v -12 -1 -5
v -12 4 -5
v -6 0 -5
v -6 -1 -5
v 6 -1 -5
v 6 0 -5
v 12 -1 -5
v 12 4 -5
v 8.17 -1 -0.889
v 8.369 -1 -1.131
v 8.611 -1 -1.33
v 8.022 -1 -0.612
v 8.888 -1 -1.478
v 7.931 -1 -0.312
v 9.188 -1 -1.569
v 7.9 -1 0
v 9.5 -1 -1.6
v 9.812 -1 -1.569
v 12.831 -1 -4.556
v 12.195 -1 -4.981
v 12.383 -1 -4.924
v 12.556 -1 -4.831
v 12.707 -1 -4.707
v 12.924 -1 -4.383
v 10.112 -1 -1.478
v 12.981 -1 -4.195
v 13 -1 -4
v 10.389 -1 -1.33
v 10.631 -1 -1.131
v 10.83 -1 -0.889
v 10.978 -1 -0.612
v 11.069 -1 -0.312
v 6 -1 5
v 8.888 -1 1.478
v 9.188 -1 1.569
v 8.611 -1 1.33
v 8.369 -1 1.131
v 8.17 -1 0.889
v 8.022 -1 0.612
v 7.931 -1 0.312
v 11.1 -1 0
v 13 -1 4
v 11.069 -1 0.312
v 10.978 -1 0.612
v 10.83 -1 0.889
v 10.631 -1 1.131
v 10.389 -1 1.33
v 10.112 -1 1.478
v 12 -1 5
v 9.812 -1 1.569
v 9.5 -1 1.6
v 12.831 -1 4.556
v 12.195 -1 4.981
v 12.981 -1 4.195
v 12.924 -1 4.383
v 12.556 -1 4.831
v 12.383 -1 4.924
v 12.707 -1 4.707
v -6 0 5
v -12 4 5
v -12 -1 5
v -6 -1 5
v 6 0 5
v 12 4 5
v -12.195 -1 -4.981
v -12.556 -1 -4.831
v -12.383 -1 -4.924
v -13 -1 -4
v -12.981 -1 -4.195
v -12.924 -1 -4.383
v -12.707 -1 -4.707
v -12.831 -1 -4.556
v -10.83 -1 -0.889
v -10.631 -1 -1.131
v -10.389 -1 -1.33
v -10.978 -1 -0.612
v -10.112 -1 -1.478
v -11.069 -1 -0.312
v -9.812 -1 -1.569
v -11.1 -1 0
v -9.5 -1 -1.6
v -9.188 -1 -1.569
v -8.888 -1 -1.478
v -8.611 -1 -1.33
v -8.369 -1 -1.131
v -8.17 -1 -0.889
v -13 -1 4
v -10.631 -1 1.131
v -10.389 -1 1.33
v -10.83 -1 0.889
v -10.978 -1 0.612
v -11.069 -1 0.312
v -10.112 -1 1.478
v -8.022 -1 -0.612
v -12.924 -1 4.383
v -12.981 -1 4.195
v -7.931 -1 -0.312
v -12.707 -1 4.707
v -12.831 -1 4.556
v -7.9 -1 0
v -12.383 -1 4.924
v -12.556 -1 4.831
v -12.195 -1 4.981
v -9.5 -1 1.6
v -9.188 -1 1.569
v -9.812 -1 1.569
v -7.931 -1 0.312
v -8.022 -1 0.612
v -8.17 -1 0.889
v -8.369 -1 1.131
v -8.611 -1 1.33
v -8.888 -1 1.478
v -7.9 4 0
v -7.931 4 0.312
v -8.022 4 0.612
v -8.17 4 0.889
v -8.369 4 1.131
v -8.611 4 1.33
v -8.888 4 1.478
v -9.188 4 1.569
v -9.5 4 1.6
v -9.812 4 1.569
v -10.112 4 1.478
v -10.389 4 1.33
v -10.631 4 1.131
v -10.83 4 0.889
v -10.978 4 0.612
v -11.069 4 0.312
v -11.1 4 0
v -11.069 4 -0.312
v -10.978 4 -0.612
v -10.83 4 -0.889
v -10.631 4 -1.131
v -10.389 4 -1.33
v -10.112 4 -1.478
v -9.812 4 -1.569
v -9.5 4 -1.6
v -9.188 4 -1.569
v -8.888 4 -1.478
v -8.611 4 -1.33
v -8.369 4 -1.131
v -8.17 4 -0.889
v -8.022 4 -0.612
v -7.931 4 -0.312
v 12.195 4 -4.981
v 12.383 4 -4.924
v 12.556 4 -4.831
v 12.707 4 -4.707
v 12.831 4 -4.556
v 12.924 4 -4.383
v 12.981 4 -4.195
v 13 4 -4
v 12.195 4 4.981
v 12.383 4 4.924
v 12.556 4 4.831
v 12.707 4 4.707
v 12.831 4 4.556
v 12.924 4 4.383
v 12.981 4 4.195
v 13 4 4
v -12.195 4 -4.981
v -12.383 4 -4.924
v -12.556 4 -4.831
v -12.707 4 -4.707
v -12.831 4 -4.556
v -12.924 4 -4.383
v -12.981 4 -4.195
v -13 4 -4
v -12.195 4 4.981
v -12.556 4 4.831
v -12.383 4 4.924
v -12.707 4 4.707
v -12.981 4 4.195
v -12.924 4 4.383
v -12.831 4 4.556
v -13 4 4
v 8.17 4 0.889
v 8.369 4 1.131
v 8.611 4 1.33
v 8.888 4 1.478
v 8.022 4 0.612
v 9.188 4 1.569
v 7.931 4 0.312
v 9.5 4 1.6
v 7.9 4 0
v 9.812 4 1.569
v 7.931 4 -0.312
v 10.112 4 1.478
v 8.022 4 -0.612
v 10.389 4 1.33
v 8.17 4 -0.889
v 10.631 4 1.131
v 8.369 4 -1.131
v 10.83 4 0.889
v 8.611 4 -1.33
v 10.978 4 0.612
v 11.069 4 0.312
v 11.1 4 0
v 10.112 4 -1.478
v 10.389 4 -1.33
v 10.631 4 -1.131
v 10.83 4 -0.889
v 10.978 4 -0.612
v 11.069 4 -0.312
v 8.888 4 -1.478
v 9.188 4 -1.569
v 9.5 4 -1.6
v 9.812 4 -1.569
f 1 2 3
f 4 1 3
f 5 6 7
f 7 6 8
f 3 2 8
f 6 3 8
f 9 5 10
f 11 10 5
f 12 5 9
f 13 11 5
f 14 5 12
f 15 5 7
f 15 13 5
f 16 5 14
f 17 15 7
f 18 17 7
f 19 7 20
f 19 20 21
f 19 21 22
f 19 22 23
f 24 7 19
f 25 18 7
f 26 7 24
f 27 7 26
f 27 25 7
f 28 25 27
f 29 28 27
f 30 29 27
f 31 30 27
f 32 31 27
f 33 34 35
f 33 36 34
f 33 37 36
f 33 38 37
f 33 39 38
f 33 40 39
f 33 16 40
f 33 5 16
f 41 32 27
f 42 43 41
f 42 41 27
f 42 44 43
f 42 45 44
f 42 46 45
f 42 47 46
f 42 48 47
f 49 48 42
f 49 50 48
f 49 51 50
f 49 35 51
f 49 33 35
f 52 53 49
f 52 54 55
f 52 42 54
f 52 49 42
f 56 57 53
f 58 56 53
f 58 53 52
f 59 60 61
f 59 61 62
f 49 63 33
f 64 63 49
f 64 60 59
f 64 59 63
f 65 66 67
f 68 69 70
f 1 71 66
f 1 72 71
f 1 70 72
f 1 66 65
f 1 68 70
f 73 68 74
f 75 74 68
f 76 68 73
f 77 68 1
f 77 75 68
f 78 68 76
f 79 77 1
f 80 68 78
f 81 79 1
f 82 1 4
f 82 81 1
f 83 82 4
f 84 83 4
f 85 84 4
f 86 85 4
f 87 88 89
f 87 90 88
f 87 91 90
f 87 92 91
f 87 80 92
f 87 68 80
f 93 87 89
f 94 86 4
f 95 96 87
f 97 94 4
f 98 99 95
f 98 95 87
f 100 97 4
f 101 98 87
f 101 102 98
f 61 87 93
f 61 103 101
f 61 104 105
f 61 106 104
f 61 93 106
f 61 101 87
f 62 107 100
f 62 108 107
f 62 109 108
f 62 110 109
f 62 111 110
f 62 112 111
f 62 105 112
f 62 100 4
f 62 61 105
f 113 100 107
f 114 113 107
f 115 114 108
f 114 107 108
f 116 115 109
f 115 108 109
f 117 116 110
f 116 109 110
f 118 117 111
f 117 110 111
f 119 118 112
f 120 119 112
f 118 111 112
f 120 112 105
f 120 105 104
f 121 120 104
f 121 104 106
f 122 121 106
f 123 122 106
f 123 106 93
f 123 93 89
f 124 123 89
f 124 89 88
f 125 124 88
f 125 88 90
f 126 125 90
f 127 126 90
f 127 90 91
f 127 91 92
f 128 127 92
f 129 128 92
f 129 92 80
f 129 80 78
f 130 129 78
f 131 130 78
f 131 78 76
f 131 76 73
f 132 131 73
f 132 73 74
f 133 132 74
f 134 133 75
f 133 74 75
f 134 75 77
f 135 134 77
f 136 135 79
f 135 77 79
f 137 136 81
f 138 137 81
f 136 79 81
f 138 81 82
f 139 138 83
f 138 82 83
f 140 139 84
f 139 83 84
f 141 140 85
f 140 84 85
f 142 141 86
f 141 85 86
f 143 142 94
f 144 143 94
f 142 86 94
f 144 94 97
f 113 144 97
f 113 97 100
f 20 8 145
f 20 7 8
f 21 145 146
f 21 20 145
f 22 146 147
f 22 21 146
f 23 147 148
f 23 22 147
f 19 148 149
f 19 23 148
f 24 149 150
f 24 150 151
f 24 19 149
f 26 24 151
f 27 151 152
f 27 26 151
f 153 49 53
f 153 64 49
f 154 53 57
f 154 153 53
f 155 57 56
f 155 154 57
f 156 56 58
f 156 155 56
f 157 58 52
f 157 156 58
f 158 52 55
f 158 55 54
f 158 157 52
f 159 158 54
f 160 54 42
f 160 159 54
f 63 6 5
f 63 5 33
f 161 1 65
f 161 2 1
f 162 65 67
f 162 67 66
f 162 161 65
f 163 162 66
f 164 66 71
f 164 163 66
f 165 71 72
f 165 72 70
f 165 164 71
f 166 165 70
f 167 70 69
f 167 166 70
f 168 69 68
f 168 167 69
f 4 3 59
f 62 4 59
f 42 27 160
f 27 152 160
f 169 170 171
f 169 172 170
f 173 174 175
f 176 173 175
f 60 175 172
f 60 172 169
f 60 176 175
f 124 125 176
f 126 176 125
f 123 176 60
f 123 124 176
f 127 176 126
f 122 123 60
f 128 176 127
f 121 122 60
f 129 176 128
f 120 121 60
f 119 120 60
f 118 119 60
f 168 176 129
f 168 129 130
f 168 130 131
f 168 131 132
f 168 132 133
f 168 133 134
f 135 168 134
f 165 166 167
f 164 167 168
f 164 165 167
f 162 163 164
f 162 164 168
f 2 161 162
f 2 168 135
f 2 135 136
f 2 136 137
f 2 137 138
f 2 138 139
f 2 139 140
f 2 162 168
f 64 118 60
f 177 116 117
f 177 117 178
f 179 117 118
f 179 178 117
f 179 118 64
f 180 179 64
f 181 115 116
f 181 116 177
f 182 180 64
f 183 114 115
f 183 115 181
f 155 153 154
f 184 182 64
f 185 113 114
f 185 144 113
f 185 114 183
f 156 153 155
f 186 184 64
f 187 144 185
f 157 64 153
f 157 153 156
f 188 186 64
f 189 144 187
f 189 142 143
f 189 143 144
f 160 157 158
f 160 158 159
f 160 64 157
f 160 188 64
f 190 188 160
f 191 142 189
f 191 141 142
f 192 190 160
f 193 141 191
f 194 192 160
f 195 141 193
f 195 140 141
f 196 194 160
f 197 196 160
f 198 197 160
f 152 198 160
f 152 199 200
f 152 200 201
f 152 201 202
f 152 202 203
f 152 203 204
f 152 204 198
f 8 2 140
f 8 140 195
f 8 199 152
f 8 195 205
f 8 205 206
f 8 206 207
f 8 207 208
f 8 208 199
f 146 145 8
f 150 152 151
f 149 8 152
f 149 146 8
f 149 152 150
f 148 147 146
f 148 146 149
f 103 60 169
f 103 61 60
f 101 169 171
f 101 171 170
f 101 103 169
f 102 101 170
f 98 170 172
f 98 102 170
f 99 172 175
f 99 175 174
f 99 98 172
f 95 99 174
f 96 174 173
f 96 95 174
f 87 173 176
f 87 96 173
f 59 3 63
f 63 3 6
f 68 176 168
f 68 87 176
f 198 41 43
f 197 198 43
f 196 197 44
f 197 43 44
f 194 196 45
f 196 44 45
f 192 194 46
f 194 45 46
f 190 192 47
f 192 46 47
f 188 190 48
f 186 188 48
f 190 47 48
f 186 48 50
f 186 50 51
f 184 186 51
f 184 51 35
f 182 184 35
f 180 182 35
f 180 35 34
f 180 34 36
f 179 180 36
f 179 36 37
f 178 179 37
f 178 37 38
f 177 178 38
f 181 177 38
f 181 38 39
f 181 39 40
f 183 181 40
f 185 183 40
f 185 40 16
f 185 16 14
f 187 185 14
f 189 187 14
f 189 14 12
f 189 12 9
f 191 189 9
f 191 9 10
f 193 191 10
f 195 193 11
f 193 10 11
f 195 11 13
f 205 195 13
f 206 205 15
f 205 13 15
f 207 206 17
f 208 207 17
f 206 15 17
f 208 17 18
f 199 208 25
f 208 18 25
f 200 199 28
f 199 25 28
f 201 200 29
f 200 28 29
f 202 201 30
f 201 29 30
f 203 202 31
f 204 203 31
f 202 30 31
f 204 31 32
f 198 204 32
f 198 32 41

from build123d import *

# Parameters (mm, degrees)
SKETCH_2_W          = 26
SKETCH_2_H          = 10
EXTRUDE_1_DEPTH     = 4
SKETCH_3_W          = 7
SKETCH_3_H          = 10
EXTRUDE_2_DEPTH     = 1
SKETCH_4_R          = 1.6
CUT_EXTRUDE_1_DEPTH = 6
FILLET_1_R          = 1


with BuildPart() as part:
    # 草图2 → 凸台-拉伸1 (new body)
    with BuildSketch(Plane(origin=(0, 0, 0), x_dir=(1, 0, 0), z_dir=(0, 1, 0))):
        Rectangle(SKETCH_2_W, SKETCH_2_H)
    extrude(amount=EXTRUDE_1_DEPTH)

    # 草图3 → 凸台-拉伸2 (add)
    with BuildSketch(Plane.XZ):
        with Locations((9.5, 0)):
            Rectangle(SKETCH_3_W, SKETCH_3_H)
        with Locations((-9.5, 0)):
            Rectangle(SKETCH_3_W, SKETCH_3_H)
    extrude(amount=EXTRUDE_2_DEPTH)

    # 草图4 → 切除-拉伸1 (cut, through all)
    with BuildSketch(Plane.XZ.offset(1)):
        with Locations((9.5, 0)):
            Circle(SKETCH_4_R)
        with Locations((-9.5, 0)):
            Circle(SKETCH_4_R)
    extrude(amount=-CUT_EXTRUDE_1_DEPTH, mode=Mode.SUBTRACT)

    # 圆角1
    fillet_1_edges = [part.edges().sort_by_distance(p)[0] for p in [
        (13, 1.5, 5),
        (-13, 1.5, 5),
        (-13, 1.5, -5),
        (13, 1.5, -5),
    ]]
    fillet(fillet_1_edges, radius=FILLET_1_R)


solid = part.part
